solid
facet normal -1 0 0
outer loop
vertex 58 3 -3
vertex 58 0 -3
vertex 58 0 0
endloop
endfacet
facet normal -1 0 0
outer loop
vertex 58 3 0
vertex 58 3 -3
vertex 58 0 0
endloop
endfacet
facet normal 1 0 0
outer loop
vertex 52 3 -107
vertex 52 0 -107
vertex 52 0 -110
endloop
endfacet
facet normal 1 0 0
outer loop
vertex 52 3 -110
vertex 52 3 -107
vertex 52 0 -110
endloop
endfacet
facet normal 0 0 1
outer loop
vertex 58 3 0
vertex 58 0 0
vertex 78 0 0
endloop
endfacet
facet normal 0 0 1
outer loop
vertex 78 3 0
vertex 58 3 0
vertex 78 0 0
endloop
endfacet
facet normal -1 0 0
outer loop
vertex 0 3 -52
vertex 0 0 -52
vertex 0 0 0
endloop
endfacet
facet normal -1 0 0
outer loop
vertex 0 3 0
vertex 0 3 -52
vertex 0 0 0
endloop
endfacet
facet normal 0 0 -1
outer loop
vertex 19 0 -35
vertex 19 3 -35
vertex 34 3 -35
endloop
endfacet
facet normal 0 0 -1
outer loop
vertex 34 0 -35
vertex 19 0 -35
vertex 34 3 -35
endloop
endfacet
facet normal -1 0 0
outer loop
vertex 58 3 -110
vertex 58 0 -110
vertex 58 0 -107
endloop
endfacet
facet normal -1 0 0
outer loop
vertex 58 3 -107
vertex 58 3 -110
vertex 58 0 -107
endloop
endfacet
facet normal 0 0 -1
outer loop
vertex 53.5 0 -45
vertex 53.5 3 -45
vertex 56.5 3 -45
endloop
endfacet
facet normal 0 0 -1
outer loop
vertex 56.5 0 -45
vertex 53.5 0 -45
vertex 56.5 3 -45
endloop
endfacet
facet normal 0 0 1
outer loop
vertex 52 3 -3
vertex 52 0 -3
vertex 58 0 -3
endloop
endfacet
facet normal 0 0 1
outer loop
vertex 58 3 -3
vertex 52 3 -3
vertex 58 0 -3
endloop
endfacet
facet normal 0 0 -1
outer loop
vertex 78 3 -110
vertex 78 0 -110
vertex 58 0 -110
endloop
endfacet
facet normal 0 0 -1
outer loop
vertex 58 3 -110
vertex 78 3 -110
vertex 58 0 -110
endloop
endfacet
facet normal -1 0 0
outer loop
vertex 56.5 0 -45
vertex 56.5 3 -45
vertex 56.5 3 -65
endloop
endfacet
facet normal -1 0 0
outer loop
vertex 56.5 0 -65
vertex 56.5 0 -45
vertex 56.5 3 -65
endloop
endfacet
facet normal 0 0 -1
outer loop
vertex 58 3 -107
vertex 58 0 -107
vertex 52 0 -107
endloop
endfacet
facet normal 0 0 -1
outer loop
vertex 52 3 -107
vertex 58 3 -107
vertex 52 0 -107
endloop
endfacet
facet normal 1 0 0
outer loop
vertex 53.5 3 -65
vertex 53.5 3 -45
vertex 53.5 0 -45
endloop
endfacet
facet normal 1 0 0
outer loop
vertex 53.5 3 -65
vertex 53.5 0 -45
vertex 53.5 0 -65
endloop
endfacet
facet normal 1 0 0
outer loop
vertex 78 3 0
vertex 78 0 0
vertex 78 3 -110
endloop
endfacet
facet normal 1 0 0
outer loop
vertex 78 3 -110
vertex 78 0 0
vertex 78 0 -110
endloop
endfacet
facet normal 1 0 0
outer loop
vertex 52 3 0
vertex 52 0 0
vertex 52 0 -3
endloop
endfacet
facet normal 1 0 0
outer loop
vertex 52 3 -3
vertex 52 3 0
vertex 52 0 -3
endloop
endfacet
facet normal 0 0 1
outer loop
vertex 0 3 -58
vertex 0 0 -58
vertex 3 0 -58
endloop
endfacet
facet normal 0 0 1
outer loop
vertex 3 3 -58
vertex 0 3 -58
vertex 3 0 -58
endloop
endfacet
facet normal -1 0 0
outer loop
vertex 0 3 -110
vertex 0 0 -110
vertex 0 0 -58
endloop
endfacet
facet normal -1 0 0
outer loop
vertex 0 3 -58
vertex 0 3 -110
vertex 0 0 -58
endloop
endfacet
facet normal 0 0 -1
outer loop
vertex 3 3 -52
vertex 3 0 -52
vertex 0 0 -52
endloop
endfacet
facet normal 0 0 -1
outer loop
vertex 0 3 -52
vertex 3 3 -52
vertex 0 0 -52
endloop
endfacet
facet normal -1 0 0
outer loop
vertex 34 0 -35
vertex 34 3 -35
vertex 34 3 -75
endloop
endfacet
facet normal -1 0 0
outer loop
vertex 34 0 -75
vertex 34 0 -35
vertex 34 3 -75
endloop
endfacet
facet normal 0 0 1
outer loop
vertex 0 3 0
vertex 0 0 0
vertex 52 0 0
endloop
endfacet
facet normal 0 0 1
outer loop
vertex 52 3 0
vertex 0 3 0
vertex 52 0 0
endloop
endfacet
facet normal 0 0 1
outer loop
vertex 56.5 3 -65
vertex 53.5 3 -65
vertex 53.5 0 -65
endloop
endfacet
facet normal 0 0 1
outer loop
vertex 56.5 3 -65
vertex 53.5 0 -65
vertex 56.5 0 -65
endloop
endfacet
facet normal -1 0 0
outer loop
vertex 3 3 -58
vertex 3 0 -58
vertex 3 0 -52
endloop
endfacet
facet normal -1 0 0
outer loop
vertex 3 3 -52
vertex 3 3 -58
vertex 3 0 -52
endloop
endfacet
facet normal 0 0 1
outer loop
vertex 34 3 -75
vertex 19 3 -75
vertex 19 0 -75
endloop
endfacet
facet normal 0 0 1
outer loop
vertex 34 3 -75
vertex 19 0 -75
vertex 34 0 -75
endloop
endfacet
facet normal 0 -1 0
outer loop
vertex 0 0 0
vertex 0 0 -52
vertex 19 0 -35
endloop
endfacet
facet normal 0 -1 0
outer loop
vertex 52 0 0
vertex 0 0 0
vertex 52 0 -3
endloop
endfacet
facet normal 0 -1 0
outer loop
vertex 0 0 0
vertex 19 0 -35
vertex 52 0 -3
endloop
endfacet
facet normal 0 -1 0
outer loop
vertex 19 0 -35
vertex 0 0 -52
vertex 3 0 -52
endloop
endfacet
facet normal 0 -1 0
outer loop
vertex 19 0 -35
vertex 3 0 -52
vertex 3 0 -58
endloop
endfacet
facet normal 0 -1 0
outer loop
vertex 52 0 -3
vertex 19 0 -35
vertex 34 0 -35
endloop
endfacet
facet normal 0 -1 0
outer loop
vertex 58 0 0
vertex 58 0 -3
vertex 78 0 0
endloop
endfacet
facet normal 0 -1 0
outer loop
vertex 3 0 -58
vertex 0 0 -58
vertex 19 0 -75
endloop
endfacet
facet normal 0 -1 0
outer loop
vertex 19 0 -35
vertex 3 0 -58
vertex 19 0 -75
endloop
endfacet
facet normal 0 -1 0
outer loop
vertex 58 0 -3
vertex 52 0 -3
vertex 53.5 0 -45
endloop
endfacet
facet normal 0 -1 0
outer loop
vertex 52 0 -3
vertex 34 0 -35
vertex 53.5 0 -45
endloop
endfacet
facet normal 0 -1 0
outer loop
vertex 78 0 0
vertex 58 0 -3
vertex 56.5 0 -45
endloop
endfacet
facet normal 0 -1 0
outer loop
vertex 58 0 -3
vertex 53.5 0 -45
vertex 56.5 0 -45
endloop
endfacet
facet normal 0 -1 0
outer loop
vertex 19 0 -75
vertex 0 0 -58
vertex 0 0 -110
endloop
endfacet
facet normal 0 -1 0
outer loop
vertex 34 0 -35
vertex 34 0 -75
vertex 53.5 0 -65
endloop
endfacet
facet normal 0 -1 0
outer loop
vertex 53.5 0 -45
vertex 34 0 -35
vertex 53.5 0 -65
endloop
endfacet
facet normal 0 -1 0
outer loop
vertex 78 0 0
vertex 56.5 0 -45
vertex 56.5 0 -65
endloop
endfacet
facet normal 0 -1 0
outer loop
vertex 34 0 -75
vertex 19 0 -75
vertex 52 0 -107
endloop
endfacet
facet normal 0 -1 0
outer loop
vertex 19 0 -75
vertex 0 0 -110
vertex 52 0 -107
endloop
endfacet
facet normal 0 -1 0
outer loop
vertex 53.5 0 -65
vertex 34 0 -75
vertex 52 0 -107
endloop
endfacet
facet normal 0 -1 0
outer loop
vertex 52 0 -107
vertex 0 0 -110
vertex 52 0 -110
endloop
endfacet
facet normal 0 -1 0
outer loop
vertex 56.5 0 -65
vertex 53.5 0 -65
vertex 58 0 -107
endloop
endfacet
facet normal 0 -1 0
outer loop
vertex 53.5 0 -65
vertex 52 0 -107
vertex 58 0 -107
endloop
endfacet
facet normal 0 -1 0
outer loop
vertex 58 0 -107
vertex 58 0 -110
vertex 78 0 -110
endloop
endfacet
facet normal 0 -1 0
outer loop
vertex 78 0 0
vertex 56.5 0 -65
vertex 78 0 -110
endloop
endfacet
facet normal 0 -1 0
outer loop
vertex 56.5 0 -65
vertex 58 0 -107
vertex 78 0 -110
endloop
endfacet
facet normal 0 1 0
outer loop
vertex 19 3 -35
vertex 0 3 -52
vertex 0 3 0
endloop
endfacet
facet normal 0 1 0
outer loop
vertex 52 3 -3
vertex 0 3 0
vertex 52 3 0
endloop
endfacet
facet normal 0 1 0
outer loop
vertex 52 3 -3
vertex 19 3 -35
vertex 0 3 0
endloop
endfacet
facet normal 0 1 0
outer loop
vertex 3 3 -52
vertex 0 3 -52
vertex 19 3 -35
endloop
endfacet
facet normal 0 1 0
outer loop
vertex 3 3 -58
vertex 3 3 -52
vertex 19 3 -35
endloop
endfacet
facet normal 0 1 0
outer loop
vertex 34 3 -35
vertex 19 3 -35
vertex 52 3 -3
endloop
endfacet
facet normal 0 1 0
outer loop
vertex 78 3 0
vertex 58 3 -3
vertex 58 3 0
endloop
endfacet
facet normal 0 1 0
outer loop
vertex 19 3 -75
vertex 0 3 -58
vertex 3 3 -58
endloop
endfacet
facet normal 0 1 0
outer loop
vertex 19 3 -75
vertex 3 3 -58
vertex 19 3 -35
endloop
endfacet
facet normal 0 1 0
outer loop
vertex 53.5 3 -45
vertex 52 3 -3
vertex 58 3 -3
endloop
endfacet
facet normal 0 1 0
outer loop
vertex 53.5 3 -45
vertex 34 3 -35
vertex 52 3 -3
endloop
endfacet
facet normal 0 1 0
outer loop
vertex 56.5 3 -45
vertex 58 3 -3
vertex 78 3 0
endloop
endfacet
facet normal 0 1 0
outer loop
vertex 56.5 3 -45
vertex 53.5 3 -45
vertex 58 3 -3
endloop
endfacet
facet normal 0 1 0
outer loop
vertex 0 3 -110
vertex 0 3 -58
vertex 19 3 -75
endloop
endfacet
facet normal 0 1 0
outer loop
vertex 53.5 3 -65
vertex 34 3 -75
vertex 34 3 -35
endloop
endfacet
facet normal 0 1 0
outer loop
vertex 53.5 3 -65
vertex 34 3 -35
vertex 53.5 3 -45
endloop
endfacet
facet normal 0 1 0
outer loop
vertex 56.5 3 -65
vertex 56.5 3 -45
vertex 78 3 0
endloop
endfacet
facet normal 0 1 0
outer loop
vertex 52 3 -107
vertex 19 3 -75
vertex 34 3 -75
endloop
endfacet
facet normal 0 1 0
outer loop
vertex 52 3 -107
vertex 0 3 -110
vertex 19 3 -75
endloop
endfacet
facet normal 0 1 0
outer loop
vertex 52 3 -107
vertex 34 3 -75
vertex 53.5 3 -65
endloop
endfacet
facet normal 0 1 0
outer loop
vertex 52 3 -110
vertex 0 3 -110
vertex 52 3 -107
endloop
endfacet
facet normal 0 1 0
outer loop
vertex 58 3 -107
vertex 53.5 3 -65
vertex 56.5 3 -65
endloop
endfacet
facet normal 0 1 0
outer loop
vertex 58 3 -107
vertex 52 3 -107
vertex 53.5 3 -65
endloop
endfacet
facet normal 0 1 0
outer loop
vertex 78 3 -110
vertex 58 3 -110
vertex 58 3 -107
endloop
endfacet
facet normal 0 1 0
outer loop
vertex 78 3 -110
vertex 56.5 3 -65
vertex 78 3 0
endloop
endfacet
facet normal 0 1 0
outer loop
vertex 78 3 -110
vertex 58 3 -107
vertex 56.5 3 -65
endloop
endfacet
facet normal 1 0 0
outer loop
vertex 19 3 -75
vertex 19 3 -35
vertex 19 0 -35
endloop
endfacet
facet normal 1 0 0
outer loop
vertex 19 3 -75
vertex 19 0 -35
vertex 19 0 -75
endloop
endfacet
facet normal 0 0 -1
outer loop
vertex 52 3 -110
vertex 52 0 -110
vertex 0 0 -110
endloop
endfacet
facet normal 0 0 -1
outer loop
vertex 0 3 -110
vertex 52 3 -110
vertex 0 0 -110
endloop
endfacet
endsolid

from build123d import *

# Parameters (mm, degrees)
EXTRUDE_3_DEPTH    = 3
SKETCH1_W          = 15
SKETCH1_H          = 40
SKETCH1_W_2        = 3
SKETCH1_H_2        = 20
CUT_EXTRUDE1_DEPTH = 10


with BuildPart() as part:
    # Эскиз4 → Бобышка-Вытянуть3 (new body)
    with BuildSketch(Plane(origin=(0, 0, 0), x_dir=(1, 0, 0), z_dir=(0, 1, 0))):
        Polygon((78, 0), (78, 110), (58, 110), (58, 107), (55, 107), (52, 107), (52, 110), (0, 110), (0, 58), (3, 58), (3, 55), (3, 52), (0, 52), (0, 0), (52, 0), (52, 3), (55, 3), (58, 3), (58, 0), align=None)
    extrude(amount=EXTRUDE_3_DEPTH)

    # Sketch1 → Cut-Extrude1 (cut)
    with BuildSketch(Plane(origin=(0, 3, 0), x_dir=(1, 0, 0), z_dir=(0, 1, 0))):
        with Locations((26.5, 55)):
            Rectangle(SKETCH1_W, SKETCH1_H)
        with Locations((55, 55)):
            Rectangle(SKETCH1_W_2, SKETCH1_H_2)
    extrude(amount=-CUT_EXTRUDE1_DEPTH, mode=Mode.SUBTRACT)


solid = part.part
